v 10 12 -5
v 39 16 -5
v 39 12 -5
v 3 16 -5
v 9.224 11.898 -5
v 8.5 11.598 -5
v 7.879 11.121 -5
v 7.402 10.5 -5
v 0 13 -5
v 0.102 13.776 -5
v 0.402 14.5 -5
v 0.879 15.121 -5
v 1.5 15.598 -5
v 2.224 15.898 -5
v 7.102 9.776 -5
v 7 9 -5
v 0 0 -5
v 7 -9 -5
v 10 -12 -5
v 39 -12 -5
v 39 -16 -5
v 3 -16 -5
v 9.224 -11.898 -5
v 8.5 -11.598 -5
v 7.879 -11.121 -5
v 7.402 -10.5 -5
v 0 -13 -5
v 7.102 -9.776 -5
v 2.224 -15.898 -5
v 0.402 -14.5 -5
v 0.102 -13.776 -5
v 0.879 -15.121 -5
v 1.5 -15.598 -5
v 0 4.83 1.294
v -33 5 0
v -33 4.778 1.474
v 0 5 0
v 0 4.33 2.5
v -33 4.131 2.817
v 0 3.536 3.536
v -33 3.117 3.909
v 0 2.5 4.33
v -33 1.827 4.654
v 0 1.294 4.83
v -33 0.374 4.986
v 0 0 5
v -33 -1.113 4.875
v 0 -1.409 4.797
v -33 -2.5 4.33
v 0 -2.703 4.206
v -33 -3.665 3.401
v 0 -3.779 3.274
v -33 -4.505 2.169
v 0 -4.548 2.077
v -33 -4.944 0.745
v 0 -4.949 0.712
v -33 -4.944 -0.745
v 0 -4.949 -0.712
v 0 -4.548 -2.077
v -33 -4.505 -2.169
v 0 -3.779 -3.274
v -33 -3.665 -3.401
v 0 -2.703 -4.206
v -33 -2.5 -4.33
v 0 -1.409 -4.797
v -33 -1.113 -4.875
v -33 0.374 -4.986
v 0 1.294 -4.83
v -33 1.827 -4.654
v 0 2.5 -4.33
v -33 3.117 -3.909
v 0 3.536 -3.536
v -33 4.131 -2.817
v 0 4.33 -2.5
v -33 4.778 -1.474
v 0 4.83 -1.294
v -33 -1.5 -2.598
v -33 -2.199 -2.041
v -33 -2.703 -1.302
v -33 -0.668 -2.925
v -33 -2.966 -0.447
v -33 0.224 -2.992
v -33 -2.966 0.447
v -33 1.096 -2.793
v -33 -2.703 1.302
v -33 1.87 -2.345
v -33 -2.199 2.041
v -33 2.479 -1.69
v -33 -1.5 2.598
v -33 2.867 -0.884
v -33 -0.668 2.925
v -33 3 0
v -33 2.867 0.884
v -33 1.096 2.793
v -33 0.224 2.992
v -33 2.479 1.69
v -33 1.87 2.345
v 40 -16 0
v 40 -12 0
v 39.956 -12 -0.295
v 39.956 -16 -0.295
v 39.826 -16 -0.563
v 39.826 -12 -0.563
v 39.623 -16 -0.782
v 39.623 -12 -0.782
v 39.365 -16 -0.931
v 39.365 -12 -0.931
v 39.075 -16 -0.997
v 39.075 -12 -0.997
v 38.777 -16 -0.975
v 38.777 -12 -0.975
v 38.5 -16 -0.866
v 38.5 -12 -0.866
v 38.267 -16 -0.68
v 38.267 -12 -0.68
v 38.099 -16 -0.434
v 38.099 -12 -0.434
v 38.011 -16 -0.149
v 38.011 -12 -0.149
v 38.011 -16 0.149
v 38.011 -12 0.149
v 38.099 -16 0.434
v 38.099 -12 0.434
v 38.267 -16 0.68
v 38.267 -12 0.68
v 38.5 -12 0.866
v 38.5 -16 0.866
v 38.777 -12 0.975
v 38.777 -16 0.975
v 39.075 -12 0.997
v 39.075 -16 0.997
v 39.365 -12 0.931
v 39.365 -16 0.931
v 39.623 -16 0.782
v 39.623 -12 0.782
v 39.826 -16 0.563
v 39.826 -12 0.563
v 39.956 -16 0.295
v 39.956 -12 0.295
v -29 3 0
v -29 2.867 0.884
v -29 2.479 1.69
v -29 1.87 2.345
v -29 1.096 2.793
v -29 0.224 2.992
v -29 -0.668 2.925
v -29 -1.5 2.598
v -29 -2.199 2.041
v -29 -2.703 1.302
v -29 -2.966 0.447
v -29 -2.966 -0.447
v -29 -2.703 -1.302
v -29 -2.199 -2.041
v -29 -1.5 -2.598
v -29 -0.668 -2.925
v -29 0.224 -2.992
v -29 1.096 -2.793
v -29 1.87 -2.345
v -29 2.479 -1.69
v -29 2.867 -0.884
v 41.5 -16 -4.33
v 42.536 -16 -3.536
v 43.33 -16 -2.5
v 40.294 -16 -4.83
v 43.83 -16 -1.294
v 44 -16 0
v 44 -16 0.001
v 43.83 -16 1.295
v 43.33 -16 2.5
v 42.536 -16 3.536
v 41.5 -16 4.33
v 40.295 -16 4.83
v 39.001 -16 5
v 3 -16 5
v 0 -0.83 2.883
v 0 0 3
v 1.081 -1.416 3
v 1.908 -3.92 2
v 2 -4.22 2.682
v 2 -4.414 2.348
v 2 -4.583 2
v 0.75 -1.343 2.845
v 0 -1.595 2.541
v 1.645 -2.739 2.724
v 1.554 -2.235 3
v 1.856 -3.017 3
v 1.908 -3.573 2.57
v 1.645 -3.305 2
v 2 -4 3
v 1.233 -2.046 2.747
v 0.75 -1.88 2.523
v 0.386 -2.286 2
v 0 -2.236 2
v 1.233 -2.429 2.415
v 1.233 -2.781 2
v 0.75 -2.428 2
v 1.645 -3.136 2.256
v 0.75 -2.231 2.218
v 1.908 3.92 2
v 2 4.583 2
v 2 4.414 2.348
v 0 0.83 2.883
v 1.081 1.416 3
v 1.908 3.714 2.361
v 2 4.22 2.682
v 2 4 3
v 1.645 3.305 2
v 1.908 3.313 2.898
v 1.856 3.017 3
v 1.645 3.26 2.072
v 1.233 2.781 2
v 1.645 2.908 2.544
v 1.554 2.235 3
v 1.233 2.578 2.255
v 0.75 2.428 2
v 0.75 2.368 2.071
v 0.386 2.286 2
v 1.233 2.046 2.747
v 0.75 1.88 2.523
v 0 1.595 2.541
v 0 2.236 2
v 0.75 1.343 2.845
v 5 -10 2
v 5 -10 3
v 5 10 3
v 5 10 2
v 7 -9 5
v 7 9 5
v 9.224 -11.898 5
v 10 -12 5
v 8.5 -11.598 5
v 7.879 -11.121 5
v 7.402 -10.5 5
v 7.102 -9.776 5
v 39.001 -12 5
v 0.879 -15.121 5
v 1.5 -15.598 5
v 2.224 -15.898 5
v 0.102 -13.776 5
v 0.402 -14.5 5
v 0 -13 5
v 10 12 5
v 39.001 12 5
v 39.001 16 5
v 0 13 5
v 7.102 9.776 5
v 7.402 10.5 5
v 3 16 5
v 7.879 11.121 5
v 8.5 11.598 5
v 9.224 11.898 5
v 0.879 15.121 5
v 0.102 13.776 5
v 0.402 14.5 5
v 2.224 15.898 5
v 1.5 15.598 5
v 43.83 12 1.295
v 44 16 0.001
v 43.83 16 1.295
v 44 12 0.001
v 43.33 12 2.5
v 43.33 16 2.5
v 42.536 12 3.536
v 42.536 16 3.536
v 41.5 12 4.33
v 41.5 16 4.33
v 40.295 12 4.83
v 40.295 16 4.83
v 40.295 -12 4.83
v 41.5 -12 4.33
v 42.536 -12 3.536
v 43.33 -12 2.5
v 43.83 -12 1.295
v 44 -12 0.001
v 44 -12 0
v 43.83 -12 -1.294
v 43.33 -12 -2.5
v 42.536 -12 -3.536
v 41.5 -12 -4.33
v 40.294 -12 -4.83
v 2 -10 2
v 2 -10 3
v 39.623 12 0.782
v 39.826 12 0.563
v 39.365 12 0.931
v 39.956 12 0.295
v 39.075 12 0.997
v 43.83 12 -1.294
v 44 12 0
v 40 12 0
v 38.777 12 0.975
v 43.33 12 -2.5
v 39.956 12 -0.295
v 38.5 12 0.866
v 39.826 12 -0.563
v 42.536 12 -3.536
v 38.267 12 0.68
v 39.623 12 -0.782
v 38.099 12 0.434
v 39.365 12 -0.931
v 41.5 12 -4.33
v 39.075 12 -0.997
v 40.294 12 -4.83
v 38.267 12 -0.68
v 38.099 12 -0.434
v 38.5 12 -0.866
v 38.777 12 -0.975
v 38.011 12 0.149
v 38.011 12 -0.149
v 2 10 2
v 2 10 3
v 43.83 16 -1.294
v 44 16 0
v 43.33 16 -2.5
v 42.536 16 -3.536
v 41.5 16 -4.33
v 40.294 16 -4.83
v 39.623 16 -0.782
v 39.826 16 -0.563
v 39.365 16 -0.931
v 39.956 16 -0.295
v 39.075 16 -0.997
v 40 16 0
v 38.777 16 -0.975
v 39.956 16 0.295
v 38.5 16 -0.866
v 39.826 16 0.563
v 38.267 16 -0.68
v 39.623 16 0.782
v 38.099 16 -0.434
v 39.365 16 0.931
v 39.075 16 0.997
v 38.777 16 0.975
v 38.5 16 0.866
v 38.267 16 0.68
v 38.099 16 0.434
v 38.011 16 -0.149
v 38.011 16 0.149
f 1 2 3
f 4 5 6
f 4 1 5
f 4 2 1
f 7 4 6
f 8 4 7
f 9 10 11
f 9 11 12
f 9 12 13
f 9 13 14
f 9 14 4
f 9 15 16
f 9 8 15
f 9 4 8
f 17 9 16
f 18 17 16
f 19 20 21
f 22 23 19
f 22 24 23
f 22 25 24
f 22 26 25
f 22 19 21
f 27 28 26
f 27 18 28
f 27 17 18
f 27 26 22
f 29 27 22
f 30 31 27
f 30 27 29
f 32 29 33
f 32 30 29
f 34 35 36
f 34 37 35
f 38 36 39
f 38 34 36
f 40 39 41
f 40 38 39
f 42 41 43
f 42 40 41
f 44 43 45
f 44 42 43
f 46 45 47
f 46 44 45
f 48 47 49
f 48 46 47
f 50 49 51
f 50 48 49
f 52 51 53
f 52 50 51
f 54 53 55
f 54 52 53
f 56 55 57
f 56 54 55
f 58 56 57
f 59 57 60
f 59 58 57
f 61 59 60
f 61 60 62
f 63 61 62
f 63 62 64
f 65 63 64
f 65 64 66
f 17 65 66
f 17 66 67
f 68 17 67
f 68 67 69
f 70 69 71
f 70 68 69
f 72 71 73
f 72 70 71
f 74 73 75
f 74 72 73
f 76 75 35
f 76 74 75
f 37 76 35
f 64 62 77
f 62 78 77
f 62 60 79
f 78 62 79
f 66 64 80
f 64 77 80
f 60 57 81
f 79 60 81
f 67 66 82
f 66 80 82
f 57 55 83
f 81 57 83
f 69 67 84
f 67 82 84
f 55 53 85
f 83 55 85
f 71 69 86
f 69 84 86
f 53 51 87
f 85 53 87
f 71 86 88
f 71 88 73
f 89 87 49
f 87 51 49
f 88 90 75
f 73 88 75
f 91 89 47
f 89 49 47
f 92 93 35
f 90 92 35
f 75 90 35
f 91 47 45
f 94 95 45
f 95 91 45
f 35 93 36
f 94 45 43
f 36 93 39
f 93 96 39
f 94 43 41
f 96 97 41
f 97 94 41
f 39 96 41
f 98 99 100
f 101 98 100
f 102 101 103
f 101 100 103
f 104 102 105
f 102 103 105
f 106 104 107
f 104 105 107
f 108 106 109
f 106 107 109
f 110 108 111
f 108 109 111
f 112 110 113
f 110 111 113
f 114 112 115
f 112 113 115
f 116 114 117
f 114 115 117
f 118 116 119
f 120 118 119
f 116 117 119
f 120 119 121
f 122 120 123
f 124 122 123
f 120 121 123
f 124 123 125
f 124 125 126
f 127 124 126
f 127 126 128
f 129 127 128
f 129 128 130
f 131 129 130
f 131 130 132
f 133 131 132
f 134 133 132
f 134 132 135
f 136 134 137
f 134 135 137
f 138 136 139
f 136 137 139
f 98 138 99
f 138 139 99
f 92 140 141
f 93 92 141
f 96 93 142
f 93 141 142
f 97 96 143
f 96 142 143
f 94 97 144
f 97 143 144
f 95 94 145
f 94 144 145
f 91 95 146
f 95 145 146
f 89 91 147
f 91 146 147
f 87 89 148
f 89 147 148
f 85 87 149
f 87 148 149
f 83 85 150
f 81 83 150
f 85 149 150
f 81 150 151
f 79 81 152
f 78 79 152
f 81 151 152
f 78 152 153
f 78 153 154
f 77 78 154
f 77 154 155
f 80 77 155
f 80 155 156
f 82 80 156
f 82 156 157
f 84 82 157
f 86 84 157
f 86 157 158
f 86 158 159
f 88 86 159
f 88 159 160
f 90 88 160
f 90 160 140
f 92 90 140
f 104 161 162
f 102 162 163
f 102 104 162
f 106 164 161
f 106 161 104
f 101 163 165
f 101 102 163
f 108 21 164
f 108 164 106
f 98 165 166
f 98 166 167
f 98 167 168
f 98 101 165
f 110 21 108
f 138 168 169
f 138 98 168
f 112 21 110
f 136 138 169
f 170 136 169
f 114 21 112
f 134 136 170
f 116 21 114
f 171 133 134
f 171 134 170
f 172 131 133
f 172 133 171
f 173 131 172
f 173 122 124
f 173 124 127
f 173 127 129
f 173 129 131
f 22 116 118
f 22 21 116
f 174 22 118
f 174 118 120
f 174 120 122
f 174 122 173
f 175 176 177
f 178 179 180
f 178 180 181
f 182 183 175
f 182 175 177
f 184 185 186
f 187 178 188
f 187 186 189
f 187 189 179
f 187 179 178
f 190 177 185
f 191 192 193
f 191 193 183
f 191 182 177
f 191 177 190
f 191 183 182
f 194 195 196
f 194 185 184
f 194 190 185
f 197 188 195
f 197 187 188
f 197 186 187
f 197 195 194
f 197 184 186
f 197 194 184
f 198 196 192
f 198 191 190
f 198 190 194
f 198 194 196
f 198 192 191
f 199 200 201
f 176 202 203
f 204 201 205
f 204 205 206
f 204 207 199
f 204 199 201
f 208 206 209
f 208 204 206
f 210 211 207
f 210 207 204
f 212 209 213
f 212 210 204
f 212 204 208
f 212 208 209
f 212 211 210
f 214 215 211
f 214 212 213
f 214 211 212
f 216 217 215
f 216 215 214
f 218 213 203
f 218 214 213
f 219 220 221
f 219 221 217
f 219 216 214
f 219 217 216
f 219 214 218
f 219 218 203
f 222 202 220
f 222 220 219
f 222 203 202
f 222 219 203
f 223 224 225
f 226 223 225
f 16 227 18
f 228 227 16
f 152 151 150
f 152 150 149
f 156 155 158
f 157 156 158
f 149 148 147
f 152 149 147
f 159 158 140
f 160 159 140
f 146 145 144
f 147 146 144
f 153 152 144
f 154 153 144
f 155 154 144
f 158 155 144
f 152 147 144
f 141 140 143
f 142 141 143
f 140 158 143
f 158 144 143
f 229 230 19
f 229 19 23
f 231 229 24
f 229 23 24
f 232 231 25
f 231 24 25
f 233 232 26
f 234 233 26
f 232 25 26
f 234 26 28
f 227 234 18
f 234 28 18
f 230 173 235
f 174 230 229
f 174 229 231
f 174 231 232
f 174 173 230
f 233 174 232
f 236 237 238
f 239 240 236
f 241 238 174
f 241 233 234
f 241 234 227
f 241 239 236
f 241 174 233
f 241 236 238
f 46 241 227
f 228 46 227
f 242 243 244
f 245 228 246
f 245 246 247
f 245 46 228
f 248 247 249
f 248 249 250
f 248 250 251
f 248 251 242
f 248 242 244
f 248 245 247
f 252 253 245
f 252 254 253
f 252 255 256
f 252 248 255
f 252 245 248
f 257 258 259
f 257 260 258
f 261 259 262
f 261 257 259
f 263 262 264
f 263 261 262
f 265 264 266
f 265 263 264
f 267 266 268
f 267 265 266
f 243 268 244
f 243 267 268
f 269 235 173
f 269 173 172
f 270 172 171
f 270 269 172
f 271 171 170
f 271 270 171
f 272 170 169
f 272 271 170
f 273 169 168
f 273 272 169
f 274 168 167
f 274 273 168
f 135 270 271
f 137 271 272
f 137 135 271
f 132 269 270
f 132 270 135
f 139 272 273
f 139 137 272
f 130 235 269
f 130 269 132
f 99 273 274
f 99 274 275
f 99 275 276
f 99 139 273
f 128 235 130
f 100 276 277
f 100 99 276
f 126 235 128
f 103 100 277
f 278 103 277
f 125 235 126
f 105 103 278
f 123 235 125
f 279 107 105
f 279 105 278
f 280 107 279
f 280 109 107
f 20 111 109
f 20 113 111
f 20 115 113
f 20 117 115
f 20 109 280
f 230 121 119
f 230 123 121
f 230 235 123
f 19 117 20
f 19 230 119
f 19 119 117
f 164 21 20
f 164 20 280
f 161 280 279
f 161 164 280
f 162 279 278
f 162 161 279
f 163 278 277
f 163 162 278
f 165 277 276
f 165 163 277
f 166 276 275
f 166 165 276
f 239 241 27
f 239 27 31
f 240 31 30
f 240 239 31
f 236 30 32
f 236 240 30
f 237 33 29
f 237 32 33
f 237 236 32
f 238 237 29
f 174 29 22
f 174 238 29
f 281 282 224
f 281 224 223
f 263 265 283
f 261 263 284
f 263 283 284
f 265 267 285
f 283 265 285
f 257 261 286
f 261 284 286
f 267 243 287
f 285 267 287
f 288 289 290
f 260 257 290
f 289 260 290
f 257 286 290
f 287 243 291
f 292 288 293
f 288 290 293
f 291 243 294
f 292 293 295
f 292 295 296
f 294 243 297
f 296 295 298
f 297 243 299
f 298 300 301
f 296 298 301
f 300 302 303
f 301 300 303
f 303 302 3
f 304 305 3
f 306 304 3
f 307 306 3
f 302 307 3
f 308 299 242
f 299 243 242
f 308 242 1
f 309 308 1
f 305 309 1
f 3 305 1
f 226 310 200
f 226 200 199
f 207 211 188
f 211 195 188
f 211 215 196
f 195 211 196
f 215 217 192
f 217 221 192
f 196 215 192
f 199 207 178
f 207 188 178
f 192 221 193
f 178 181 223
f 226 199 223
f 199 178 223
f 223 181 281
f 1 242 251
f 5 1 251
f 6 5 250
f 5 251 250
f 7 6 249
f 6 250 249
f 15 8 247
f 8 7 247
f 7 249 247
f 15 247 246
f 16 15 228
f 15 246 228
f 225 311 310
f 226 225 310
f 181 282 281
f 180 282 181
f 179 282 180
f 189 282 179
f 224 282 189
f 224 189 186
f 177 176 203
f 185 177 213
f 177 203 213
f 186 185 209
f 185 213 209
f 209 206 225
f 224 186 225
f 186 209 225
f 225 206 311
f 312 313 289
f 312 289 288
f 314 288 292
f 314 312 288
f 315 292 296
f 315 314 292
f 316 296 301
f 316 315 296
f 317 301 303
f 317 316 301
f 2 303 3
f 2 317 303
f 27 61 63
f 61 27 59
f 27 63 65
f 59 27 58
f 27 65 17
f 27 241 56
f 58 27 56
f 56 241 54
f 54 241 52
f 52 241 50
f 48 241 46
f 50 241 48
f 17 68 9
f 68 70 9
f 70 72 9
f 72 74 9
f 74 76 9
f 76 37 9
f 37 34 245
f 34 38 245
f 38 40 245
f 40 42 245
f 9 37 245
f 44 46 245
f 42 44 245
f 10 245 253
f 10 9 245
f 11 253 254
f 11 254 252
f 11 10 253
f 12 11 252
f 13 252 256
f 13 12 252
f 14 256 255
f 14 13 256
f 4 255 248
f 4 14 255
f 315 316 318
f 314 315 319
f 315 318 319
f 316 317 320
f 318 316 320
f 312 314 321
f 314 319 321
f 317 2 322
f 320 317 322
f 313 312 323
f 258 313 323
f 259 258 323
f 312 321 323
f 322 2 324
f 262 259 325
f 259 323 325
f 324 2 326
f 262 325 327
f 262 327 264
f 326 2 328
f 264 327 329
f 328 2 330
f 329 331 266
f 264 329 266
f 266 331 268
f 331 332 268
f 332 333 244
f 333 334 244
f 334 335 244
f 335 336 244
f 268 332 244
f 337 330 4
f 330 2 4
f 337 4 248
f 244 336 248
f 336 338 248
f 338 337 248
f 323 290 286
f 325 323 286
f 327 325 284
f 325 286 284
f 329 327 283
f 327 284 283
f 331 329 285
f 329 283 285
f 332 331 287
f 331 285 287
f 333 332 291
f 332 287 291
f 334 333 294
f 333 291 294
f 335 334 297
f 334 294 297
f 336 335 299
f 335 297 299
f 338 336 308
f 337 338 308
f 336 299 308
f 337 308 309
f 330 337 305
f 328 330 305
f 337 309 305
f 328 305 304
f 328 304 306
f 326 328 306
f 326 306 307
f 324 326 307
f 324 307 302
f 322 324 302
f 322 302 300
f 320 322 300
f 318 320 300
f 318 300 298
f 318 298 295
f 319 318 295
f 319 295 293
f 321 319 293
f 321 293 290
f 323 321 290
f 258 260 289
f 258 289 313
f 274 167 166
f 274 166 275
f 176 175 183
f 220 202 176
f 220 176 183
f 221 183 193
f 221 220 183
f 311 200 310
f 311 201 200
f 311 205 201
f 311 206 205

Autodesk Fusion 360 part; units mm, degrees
ref_plane "WorkPlane1" through (4, 0, 0) normal (1, 0, 0) x (0, 1, 0)
sketch "Sketch2" plane through (0, 0, 0) normal (1, 0, 0) x (0, 1, 0)
  line L0 (-12, 0) -> (-16, 0)
  line L1 (-16, 0) -> (-16, 5)
  line L2 (-16, 5) -> (-12, 5)
  line L3 (-12, 5) -> (-12, 0)
  line L4 (12, 0) -> (16, 0)
  line L5 (16, 0) -> (16, 5)
  line L6 (16, 5) -> (12, 5)
  line L7 (12, 5) -> (12, 0)
  line L8 (-12, 5) -> (12, 5)
  line L9 (12, 5) -> (12, 0)
  line L10 (12, 0) -> (-12, 0)
  line L11 (-12, 0) -> (-12, 5)
extrude "Extrude1" add sketch "Sketch2" along normal blind 7 contours L3 L7 L8 L9 L10 L11 makes body 1
extrude "Extrude2" add sketch "Sketch2" along normal blind 44 separate body contours L0 L1 L2 L3 L11 | L4 L5 L6 L7 L9 makes body 2 at (29.3333, -16, 1.6667) makes body 3 at (29.3333, 12, 3.3333)
fillet "Fillet1" radius 5 2 edges at (44, -14, 5) (44, 14, 5) on bodies 2 3
sketch "Sketch3" plane through (0, 0, 0) normal (0, 1, 0) x (1, 0, 0)
  circle A0 centre (39, 0) radius 1
  dimension "d8" = 2
sketch "Sketch4" plane through (0, 0, 0) normal (1, 0, 0) x (0, 1, 0)
  circle A0 centre (0, 0) radius 5
extrude "Extrude4" add sketch "Sketch4" against normal blind 33 bodies 1
shell "Shell1" thickness 2 removed faces 1 at (-33, -1.5016, -0.7231) on bodies 1
ref_plane "WorkPlane2" through (-2, 0, 0) normal (1, 0, 0) x (0, 1, 0)
sketch "Sketch7" plane through (-2, 0, 0) normal (1, 0, 0) x (0, 1, 0)
sketch "Sketch8" plane through (0, 0, 0) normal (1, 0, 0) x (0, 1, 0)
  circle A0 centre (0, 0) radius 3
extrude "Extrude6" add sketch "Sketch8" against normal blind 29 bodies 1
extrude "Extrude8" add 5 faces at (4.6667, 1.6667, 0) (14.6667, -13.3333, 0) (14.6667, 13.3333, 0) (14.6667, 13.3333, 0) (14.6667, -13.3333, 0) along direction (0, 0, -1) blind 5 on bodies 1 2 3 bodies 1 2 3
fillet "Fillet2" radius 5 2 edges at (44, 14, -5) (44, -14, -5) on bodies 1
extrude "Extrude12" cut sketch "Sketch3" along normal mid plane 48 bodies 1 1
fillet "Fillet3" radius 3 2 edges at (0, -16, 0) (0, 16, 0) on bodies 1
fillet "Fillet4" radius 3 2 edges at (7, -12, 0) (7, 12, 0) on bodies 1
